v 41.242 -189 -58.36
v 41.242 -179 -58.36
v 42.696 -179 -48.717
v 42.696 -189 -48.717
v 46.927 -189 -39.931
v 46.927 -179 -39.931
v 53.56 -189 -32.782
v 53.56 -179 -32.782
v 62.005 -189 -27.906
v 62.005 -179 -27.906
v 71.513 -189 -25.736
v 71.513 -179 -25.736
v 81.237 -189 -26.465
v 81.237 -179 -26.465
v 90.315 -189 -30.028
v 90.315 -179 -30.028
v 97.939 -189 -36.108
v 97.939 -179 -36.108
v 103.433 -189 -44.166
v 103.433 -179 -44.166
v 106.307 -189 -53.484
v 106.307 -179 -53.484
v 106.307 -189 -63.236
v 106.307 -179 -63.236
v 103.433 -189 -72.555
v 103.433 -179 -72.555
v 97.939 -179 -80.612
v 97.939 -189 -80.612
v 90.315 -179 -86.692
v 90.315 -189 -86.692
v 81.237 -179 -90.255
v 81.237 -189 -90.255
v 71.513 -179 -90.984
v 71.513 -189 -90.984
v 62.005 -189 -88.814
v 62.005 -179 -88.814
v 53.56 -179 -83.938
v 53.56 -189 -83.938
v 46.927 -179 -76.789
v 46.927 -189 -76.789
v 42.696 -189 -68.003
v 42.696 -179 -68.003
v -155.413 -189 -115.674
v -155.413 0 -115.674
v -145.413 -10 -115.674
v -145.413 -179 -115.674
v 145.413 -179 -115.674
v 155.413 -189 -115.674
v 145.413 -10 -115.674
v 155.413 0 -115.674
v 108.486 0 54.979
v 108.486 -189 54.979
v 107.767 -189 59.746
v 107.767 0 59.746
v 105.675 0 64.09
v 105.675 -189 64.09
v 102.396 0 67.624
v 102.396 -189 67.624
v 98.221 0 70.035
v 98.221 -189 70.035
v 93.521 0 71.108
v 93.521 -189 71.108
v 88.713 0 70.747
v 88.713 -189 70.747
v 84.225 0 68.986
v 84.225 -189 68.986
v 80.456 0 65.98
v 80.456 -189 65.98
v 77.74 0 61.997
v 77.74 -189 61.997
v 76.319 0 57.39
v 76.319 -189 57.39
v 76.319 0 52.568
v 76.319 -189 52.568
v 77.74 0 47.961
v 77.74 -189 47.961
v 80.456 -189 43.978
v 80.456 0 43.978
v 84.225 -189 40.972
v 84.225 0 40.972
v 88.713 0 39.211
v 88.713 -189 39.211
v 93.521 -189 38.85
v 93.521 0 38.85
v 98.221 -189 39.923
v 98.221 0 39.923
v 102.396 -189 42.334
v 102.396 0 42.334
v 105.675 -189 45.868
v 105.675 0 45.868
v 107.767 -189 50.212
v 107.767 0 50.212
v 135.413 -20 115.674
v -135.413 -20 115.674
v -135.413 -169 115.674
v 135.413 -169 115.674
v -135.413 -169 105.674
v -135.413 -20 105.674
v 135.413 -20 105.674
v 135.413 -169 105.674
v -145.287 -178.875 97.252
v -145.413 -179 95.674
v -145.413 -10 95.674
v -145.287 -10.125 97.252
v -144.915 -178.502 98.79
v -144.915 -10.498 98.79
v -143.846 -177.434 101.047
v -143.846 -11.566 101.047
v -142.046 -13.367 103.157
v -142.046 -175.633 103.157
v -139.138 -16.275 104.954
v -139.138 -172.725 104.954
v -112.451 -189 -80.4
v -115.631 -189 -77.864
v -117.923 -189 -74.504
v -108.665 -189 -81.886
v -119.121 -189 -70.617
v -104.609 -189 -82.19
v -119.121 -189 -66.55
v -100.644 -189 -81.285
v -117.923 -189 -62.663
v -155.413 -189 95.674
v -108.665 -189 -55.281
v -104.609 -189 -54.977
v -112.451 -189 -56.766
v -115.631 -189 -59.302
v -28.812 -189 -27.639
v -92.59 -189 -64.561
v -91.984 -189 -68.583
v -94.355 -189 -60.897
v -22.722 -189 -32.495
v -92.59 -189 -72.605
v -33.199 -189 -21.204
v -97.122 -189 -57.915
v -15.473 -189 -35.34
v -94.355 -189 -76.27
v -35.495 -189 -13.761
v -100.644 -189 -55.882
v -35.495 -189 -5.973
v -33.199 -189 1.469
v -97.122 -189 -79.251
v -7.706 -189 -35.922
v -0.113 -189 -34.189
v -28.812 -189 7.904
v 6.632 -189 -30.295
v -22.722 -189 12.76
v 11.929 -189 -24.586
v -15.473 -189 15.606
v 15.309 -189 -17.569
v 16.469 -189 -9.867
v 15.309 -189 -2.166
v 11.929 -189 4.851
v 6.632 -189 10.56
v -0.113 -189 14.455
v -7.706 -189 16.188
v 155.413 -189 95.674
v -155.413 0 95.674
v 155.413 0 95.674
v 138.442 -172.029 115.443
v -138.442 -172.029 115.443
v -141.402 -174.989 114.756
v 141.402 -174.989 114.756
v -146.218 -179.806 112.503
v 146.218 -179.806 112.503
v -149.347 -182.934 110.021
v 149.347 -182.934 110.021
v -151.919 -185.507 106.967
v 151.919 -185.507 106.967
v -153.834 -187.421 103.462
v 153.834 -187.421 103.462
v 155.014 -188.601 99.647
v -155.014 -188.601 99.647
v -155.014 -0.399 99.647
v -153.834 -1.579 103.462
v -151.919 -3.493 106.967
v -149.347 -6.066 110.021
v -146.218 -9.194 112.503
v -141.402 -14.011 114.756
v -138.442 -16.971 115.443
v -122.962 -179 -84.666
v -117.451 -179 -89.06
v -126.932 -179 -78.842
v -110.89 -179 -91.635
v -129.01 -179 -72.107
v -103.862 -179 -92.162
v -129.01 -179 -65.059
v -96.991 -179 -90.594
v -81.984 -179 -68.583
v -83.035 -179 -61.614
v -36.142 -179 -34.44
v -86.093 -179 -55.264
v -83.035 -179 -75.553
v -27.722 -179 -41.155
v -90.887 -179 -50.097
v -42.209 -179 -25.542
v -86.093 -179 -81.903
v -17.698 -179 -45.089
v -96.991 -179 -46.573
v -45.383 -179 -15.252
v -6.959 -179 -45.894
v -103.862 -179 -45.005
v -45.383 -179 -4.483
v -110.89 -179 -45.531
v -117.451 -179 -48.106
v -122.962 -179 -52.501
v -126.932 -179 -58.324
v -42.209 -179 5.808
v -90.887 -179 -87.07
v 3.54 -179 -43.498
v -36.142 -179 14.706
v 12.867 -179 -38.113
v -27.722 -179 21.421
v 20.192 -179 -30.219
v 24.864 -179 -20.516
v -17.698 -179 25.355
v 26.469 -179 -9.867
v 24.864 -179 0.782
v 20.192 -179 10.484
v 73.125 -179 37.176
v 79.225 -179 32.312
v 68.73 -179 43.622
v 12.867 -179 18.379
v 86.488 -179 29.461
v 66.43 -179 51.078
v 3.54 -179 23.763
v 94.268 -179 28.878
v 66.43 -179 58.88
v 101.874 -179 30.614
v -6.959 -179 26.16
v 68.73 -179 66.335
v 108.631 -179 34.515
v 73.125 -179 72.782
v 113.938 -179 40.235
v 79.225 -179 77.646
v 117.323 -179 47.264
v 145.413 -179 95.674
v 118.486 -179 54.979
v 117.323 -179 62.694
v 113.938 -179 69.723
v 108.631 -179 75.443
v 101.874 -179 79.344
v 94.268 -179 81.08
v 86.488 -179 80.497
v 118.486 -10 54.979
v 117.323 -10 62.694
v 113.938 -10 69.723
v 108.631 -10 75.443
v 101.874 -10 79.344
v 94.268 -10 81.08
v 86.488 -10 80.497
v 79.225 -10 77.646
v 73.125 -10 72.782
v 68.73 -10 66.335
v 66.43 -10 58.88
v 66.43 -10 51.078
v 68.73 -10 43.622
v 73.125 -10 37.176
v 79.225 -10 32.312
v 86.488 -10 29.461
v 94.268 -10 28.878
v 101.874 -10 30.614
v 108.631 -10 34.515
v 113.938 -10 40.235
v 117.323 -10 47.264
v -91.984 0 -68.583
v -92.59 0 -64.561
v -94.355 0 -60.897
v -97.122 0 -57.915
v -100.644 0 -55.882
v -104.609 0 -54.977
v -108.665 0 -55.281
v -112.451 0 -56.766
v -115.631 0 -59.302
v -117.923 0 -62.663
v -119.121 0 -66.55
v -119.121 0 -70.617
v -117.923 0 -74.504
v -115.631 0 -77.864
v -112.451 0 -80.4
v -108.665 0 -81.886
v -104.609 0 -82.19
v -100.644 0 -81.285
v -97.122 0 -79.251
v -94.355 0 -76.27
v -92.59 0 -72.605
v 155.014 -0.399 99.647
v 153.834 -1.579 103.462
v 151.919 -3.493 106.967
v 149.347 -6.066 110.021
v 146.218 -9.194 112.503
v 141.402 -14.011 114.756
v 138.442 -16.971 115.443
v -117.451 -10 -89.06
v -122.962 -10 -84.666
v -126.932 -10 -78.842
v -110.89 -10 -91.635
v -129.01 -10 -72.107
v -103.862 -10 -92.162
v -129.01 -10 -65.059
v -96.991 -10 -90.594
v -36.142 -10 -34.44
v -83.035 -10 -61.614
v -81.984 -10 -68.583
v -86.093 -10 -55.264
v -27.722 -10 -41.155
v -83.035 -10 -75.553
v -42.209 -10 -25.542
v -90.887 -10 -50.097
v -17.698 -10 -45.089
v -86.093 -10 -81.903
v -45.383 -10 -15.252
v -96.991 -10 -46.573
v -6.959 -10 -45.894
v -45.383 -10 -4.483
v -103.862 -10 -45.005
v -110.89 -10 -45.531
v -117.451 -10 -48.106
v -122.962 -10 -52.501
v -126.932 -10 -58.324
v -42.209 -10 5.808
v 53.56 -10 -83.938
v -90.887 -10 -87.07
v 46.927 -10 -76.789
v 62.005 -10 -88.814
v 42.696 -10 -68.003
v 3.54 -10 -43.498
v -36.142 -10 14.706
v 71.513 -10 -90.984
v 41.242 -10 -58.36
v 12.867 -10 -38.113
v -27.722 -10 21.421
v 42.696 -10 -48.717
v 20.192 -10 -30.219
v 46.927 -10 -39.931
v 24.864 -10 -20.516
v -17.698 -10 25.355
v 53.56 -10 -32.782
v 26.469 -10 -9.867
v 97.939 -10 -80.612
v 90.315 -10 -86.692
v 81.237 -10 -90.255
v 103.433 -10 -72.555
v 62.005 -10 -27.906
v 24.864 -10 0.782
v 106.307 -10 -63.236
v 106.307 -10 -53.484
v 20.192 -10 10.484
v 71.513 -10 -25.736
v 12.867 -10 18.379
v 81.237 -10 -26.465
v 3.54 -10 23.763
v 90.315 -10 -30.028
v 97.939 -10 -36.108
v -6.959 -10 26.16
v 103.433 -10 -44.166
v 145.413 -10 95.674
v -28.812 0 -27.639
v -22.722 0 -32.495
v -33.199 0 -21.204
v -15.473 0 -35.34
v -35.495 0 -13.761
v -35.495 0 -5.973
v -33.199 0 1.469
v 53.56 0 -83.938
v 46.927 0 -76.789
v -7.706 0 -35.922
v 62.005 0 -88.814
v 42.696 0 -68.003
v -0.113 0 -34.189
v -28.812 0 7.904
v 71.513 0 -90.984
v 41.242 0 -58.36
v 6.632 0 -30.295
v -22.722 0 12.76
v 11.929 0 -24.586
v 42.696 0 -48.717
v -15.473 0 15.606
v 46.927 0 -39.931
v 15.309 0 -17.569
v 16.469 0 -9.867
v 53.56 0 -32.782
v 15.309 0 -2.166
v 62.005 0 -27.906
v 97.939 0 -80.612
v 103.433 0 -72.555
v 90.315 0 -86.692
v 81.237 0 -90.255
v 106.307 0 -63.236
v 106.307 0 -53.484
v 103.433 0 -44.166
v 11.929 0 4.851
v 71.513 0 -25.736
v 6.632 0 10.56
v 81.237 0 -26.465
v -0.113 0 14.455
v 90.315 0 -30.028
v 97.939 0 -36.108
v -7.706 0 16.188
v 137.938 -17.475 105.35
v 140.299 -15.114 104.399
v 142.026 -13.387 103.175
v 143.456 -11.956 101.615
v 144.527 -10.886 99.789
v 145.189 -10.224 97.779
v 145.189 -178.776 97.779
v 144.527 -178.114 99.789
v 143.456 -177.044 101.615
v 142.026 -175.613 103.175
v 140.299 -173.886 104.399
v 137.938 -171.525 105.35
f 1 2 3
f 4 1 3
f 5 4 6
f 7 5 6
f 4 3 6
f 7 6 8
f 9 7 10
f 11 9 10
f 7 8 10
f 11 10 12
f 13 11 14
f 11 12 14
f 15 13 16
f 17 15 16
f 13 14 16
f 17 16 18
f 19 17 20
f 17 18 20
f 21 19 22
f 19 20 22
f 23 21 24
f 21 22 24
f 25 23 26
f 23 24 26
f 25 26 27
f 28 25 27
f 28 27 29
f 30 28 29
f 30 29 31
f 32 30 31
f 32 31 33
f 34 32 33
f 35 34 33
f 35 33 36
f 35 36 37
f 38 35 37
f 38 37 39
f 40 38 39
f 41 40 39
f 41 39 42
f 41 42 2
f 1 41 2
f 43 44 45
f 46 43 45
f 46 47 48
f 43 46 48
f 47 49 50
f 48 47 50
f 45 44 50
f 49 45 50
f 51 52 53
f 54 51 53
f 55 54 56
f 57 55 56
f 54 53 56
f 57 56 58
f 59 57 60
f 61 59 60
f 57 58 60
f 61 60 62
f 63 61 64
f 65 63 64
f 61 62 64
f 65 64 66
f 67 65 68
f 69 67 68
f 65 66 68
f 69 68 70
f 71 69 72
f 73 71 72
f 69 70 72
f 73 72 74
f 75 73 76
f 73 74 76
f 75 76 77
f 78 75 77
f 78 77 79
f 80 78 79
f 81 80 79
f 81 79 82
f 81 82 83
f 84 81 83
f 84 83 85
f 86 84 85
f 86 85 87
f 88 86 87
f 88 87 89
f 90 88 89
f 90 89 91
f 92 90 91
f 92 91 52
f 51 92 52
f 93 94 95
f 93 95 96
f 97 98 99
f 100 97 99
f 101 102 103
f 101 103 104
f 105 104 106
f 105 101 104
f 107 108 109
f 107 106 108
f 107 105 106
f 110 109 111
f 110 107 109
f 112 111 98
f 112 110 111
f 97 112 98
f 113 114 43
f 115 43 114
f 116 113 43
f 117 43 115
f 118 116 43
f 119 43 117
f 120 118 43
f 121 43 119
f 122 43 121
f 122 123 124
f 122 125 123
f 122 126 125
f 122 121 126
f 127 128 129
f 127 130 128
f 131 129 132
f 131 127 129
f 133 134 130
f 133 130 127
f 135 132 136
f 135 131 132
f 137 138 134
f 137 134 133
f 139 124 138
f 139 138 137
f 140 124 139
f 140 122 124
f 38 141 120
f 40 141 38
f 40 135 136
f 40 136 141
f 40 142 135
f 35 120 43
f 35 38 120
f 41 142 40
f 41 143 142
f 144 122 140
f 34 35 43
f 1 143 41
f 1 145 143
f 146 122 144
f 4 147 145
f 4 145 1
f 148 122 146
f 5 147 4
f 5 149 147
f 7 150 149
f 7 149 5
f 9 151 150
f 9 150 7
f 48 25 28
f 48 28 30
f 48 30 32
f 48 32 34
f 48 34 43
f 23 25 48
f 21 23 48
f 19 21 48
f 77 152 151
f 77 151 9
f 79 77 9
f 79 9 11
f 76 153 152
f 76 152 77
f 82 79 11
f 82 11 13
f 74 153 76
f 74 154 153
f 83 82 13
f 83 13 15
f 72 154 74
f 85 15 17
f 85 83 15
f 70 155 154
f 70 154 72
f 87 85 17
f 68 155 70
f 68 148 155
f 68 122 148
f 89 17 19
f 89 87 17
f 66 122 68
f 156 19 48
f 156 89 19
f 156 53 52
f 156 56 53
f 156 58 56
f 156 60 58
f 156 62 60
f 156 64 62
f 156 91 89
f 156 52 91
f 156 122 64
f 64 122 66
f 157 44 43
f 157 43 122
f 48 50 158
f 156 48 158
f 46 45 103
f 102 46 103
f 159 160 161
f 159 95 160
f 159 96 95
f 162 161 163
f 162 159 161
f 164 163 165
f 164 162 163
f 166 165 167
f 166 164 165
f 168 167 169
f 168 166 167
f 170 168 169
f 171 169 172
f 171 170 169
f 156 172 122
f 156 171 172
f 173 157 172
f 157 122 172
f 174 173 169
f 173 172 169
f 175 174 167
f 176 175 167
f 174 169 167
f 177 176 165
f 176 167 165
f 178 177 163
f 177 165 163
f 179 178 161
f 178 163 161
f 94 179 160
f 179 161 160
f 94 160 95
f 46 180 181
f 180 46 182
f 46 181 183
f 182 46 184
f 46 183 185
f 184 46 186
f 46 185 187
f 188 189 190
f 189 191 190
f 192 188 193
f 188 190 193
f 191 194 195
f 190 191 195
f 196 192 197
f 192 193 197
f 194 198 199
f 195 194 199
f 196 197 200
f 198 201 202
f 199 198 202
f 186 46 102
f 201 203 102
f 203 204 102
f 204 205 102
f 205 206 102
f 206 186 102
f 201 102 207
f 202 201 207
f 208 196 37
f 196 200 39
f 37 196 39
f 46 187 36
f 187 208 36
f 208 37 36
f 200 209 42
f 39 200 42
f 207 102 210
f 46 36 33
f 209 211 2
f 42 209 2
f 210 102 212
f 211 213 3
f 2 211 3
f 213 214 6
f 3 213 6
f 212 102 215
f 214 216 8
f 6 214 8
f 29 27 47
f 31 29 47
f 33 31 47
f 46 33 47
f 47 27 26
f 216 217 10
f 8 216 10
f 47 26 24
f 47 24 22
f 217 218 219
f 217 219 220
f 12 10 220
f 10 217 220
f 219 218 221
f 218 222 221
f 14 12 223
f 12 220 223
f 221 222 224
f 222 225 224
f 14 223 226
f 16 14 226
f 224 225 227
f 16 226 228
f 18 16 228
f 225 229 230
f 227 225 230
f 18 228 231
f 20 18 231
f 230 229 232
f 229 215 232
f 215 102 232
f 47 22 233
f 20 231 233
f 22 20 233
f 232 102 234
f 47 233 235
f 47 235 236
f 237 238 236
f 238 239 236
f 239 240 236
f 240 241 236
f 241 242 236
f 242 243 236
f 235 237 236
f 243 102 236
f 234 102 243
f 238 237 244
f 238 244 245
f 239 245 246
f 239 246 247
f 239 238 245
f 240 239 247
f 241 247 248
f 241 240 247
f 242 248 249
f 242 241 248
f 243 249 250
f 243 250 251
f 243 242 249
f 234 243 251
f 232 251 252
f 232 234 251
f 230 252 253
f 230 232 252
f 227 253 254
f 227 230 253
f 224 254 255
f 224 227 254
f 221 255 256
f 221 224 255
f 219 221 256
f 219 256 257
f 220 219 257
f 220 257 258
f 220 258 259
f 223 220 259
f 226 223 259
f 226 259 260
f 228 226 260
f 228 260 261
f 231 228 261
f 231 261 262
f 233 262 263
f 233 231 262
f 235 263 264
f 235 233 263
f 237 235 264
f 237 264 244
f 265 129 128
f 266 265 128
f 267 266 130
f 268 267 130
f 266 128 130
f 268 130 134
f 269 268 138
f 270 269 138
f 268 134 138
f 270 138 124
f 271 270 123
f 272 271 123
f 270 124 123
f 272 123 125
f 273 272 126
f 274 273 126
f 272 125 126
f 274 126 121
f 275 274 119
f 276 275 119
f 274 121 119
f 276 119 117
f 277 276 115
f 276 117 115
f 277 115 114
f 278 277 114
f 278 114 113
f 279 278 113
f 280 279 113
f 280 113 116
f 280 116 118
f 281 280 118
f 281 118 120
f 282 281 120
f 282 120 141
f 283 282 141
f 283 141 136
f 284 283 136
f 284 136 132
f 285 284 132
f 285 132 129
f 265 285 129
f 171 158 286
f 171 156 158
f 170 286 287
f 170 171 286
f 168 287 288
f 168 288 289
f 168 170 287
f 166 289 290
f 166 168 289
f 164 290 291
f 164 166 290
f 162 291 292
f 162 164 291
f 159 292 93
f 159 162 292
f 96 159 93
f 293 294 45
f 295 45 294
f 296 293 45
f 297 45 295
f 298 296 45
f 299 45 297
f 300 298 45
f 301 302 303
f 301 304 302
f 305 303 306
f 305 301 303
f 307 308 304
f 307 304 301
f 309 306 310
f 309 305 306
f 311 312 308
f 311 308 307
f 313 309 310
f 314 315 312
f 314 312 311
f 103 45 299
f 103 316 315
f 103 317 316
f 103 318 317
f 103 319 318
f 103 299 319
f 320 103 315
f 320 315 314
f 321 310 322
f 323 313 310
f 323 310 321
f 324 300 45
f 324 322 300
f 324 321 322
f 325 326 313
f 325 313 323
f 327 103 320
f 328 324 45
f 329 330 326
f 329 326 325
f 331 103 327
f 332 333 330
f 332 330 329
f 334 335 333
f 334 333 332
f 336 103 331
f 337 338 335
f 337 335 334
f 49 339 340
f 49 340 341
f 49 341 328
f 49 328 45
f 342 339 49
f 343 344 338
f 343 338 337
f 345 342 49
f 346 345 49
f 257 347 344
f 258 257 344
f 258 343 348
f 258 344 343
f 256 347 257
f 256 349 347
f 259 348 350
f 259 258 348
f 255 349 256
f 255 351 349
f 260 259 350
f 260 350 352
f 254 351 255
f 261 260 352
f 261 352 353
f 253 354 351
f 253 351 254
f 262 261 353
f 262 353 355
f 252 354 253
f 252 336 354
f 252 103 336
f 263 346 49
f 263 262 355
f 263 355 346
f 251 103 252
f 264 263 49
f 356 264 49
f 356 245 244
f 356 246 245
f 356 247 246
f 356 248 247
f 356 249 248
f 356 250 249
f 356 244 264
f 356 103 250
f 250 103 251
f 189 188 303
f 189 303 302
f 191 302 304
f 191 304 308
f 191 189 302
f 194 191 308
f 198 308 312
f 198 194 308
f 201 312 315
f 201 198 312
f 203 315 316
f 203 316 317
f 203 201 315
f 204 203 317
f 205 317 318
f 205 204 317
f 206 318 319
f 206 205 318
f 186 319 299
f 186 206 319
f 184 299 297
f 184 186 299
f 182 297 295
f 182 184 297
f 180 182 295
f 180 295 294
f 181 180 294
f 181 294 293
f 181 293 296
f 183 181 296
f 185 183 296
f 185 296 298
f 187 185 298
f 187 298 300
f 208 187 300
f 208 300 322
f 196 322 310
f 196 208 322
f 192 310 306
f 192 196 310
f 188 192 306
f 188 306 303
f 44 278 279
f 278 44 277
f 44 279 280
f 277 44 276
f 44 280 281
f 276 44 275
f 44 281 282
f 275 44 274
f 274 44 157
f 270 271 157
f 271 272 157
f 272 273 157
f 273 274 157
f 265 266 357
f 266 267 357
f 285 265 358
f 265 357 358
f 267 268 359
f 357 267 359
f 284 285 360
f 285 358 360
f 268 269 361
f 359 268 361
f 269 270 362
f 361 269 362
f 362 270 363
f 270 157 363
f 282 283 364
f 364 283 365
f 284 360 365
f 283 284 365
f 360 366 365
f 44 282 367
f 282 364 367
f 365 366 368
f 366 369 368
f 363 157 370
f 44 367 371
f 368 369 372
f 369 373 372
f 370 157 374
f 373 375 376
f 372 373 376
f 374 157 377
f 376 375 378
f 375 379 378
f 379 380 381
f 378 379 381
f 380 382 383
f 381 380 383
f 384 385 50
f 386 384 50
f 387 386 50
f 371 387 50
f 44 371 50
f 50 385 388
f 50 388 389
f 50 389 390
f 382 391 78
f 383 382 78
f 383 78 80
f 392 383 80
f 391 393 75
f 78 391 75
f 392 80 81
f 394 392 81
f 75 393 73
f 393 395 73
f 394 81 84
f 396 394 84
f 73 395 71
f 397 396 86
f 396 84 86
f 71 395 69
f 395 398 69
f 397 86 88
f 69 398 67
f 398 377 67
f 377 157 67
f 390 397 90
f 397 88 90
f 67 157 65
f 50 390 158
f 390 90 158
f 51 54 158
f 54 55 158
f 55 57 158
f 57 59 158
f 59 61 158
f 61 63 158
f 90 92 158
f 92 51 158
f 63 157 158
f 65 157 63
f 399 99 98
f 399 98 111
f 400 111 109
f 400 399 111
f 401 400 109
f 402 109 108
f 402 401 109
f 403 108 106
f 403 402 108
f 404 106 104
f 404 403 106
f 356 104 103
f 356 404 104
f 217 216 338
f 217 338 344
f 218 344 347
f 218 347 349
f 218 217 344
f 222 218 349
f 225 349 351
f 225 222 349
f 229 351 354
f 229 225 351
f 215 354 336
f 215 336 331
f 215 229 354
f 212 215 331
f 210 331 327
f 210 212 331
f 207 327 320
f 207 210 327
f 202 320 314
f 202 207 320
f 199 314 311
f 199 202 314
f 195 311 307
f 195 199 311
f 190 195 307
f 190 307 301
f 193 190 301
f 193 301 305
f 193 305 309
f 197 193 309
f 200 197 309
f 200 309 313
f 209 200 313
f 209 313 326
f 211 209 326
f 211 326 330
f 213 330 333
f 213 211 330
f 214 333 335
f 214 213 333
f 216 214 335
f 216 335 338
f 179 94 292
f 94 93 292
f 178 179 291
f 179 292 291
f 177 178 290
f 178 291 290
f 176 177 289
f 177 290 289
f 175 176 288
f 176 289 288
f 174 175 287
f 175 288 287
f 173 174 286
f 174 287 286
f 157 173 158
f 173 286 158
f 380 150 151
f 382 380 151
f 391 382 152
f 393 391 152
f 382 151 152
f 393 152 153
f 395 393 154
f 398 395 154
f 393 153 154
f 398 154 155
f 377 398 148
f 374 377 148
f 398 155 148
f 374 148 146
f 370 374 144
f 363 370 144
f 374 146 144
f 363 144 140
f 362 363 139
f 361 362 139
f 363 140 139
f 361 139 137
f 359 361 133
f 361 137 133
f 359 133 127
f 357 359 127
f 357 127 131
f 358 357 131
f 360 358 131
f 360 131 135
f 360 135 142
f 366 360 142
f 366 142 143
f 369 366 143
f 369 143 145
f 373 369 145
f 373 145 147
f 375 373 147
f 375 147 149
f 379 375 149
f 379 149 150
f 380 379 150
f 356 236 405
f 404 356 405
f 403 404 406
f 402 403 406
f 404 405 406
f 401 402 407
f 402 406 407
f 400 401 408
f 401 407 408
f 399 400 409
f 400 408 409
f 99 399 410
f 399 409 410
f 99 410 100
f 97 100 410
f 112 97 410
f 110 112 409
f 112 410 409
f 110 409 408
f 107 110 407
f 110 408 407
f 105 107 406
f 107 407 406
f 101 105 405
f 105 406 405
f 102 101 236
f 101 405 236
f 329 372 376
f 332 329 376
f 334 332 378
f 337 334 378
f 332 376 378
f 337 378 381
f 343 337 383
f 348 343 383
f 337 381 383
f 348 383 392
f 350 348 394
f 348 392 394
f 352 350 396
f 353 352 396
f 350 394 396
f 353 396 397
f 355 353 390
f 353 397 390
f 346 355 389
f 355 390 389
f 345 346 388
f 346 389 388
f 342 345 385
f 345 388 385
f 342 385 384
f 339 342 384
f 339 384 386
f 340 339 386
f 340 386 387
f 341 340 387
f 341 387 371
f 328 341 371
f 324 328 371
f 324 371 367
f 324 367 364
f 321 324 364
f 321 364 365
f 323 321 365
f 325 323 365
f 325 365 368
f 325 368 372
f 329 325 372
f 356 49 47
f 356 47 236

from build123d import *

# Parameters (mm, degrees)
F0_W     = 310.82517
F0_H     = 231.34768
F1_DEPTH = 189
F2_R     = 20
F3_R     = 13.644912
F3_R_2   = 26.127936
F3_R_3   = 16.173919
F4_DEPTH = 189.001
F5_T     = -10
F6_R     = 32.715141
F7_DEPTH = 189.001


with BuildPart() as f1:
    # F0 (on Front) → F1 (new body)
    with BuildSketch(Plane.XZ):
        Rectangle(F0_W, F0_H)
    extrude(amount=F1_DEPTH)

    # F2
    f2_edges = [f1.edges().sort_by_distance(p)[0] for p in [
        (155.412585, -94.5, 115.67384),
        (-155.412585, -94.5, 115.67384),
        (0, 0, 115.67384),
        (0, -189, 115.67384),
    ]]
    fillet(f2_edges, radius=F2_R)

    # F3 (on face) → F4 (cut, through all)
    with BuildSketch(Plane.XZ.offset(189)):
        with Locations((-105.628975, -68.58331)):
            Circle(F3_R)
        with Locations((-9.658518, -9.867162)):
            Circle(F3_R_2)
        with Locations((92.311822, 54.978933)):
            Circle(F3_R_3)
    extrude(amount=-F4_DEPTH, mode=Mode.SUBTRACT)

    # F5
    f5_openings = [f1.faces().sort_by_distance(p)[0] for p in [
        (0, -94.5, -115.67384),
    ]]
    offset(amount=F5_T, openings=f5_openings)

    # F6 (on face) → F7 (cut, through all)
    with BuildSketch(Plane(origin=(0, 0, 0), x_dir=(-1, 0, 0), z_dir=(0, 1, 0))):
        with Locations((-73.95748, -58.360144)):
            Circle(F6_R)
    extrude(amount=-F7_DEPTH, mode=Mode.SUBTRACT)


solid = f1.part
